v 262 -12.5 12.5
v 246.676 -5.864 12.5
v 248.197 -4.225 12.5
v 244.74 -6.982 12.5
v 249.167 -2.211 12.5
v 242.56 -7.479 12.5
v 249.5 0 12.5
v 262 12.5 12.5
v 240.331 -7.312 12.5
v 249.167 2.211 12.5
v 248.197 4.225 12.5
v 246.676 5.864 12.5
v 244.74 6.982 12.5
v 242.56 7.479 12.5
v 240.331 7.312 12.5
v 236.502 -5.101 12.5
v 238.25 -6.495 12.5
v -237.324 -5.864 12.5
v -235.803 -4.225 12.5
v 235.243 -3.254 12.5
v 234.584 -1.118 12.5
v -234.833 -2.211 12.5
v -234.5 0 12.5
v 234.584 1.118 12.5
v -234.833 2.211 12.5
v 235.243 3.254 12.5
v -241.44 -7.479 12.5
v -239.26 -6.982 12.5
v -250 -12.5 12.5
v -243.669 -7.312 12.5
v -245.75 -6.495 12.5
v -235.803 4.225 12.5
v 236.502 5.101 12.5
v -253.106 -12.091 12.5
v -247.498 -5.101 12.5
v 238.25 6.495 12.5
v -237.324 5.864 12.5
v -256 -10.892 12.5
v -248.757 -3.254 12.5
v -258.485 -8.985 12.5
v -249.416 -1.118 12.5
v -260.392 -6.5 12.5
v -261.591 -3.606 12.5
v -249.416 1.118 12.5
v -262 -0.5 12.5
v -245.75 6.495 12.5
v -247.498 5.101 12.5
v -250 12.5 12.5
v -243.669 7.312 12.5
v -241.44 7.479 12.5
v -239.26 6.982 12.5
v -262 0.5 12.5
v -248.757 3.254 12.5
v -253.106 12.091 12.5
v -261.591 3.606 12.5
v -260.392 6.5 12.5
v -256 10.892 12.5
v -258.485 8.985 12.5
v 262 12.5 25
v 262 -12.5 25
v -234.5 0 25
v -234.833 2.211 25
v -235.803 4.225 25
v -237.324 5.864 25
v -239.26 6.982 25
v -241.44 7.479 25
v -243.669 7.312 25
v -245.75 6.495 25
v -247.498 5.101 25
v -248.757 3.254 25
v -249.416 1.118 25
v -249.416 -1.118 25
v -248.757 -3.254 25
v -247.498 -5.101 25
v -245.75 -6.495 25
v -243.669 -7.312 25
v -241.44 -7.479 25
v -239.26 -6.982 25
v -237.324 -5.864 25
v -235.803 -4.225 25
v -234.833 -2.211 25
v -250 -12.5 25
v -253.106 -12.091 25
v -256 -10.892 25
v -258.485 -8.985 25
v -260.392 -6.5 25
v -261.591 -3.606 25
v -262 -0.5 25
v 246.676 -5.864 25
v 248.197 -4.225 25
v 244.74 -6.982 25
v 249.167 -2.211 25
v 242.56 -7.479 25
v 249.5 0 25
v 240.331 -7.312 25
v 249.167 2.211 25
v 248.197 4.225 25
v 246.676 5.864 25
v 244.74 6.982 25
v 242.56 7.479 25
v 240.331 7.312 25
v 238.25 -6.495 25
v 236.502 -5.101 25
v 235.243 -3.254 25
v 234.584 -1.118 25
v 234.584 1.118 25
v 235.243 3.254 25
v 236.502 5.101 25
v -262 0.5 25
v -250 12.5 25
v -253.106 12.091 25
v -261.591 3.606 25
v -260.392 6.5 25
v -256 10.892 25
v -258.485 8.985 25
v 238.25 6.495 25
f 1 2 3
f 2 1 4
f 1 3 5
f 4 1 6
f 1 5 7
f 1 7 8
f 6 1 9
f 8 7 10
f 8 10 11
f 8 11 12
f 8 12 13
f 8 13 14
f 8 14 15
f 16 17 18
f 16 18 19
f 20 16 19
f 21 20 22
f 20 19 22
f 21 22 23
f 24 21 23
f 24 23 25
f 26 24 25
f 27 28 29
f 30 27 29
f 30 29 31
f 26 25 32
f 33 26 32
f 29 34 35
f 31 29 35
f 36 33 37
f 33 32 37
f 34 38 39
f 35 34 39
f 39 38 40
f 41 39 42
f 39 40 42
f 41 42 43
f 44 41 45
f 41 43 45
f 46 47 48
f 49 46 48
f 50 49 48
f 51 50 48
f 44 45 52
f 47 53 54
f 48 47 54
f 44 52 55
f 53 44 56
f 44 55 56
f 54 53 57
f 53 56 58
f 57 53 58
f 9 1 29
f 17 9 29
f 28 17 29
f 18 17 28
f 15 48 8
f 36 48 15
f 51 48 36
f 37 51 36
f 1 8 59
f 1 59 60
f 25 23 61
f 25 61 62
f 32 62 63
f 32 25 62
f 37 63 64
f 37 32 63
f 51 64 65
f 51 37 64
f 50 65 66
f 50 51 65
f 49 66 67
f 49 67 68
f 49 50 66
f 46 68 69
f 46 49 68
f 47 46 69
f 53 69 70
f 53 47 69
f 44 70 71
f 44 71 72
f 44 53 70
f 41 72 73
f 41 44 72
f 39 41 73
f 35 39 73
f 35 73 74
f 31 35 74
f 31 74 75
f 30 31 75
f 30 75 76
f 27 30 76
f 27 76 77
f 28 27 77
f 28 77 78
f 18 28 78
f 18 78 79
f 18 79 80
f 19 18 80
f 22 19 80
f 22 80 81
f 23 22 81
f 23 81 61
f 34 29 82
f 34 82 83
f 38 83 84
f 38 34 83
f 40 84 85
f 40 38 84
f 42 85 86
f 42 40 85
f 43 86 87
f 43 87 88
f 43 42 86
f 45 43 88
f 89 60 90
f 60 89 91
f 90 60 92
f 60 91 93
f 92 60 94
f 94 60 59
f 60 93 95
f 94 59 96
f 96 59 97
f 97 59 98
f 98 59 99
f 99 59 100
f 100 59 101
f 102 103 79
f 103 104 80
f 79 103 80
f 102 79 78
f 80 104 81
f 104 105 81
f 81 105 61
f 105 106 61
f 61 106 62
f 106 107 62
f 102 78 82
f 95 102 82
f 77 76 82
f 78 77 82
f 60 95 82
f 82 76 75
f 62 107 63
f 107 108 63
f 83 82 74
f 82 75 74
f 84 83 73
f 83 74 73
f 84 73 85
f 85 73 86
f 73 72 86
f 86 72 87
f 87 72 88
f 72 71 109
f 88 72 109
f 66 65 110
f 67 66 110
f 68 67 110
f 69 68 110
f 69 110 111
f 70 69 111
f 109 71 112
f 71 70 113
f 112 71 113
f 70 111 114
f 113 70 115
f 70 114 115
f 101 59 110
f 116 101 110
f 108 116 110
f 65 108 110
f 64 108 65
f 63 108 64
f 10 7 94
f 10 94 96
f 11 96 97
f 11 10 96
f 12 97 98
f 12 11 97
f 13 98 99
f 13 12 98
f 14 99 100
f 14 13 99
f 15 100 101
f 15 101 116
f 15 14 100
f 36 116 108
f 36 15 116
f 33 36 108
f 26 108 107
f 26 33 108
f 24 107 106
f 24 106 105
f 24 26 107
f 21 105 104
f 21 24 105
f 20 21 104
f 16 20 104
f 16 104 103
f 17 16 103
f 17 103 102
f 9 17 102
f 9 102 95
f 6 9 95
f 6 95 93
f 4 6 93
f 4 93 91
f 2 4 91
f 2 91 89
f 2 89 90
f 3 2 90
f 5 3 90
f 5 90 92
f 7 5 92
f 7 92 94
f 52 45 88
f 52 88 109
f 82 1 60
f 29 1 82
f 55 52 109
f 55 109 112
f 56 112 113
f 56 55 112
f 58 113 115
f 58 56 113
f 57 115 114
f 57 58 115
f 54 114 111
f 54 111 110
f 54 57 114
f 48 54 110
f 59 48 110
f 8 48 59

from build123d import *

# Parameters (mm, degrees)
SKETCH1_R               = 7.5
BOSS_EXTRUDE2_DEPTH     = 25
CUT_EXTRUDE1_DEPTH      = 525.744938041
CUT_EXTRUDE1_DEPTH_BACK = 525.744938041
SKETCH2_W               = 12.5
SKETCH2_H               = 25


with BuildPart() as part:
    # Sketch1 → Boss-Extrude2 (new body)
    with BuildSketch(Plane.XY):
        with BuildLine():
            Line((-250, 12.5), (262, 12.5))
            Line((262, 12.5), (262, -12.5))
            Line((262, -12.5), (-250, -12.5))
            ThreePointArc((-250, -12.5), (-258.485281374, -8.985281374), (-262, -0.5))
            Line((-262, -0.5), (-262, 0.5))
            ThreePointArc((-262, 0.5), (-258.485281374, 8.985281374), (-250, 12.5))
        make_face()
        with Locations((-242, 0)):
            Circle(SKETCH1_R, mode=Mode.SUBTRACT)
        with Locations((242, 0)):
            Circle(SKETCH1_R, mode=Mode.SUBTRACT)
    extrude(amount=BOSS_EXTRUDE2_DEPTH)

    # Sketch2 → Cut-Extrude1 (cut, two sides: drawn at the far end of the back side and taken through both)
    with BuildSketch(Plane(origin=(262, 0, 0), x_dir=(0, 0, -1), z_dir=(1, 0, 0)).offset(-CUT_EXTRUDE1_DEPTH_BACK)):
        with Locations((-6.25, 0)):
            Rectangle(SKETCH2_W, SKETCH2_H)
    extrude(amount=CUT_EXTRUDE1_DEPTH + CUT_EXTRUDE1_DEPTH_BACK, mode=Mode.SUBTRACT)


solid = part.part
